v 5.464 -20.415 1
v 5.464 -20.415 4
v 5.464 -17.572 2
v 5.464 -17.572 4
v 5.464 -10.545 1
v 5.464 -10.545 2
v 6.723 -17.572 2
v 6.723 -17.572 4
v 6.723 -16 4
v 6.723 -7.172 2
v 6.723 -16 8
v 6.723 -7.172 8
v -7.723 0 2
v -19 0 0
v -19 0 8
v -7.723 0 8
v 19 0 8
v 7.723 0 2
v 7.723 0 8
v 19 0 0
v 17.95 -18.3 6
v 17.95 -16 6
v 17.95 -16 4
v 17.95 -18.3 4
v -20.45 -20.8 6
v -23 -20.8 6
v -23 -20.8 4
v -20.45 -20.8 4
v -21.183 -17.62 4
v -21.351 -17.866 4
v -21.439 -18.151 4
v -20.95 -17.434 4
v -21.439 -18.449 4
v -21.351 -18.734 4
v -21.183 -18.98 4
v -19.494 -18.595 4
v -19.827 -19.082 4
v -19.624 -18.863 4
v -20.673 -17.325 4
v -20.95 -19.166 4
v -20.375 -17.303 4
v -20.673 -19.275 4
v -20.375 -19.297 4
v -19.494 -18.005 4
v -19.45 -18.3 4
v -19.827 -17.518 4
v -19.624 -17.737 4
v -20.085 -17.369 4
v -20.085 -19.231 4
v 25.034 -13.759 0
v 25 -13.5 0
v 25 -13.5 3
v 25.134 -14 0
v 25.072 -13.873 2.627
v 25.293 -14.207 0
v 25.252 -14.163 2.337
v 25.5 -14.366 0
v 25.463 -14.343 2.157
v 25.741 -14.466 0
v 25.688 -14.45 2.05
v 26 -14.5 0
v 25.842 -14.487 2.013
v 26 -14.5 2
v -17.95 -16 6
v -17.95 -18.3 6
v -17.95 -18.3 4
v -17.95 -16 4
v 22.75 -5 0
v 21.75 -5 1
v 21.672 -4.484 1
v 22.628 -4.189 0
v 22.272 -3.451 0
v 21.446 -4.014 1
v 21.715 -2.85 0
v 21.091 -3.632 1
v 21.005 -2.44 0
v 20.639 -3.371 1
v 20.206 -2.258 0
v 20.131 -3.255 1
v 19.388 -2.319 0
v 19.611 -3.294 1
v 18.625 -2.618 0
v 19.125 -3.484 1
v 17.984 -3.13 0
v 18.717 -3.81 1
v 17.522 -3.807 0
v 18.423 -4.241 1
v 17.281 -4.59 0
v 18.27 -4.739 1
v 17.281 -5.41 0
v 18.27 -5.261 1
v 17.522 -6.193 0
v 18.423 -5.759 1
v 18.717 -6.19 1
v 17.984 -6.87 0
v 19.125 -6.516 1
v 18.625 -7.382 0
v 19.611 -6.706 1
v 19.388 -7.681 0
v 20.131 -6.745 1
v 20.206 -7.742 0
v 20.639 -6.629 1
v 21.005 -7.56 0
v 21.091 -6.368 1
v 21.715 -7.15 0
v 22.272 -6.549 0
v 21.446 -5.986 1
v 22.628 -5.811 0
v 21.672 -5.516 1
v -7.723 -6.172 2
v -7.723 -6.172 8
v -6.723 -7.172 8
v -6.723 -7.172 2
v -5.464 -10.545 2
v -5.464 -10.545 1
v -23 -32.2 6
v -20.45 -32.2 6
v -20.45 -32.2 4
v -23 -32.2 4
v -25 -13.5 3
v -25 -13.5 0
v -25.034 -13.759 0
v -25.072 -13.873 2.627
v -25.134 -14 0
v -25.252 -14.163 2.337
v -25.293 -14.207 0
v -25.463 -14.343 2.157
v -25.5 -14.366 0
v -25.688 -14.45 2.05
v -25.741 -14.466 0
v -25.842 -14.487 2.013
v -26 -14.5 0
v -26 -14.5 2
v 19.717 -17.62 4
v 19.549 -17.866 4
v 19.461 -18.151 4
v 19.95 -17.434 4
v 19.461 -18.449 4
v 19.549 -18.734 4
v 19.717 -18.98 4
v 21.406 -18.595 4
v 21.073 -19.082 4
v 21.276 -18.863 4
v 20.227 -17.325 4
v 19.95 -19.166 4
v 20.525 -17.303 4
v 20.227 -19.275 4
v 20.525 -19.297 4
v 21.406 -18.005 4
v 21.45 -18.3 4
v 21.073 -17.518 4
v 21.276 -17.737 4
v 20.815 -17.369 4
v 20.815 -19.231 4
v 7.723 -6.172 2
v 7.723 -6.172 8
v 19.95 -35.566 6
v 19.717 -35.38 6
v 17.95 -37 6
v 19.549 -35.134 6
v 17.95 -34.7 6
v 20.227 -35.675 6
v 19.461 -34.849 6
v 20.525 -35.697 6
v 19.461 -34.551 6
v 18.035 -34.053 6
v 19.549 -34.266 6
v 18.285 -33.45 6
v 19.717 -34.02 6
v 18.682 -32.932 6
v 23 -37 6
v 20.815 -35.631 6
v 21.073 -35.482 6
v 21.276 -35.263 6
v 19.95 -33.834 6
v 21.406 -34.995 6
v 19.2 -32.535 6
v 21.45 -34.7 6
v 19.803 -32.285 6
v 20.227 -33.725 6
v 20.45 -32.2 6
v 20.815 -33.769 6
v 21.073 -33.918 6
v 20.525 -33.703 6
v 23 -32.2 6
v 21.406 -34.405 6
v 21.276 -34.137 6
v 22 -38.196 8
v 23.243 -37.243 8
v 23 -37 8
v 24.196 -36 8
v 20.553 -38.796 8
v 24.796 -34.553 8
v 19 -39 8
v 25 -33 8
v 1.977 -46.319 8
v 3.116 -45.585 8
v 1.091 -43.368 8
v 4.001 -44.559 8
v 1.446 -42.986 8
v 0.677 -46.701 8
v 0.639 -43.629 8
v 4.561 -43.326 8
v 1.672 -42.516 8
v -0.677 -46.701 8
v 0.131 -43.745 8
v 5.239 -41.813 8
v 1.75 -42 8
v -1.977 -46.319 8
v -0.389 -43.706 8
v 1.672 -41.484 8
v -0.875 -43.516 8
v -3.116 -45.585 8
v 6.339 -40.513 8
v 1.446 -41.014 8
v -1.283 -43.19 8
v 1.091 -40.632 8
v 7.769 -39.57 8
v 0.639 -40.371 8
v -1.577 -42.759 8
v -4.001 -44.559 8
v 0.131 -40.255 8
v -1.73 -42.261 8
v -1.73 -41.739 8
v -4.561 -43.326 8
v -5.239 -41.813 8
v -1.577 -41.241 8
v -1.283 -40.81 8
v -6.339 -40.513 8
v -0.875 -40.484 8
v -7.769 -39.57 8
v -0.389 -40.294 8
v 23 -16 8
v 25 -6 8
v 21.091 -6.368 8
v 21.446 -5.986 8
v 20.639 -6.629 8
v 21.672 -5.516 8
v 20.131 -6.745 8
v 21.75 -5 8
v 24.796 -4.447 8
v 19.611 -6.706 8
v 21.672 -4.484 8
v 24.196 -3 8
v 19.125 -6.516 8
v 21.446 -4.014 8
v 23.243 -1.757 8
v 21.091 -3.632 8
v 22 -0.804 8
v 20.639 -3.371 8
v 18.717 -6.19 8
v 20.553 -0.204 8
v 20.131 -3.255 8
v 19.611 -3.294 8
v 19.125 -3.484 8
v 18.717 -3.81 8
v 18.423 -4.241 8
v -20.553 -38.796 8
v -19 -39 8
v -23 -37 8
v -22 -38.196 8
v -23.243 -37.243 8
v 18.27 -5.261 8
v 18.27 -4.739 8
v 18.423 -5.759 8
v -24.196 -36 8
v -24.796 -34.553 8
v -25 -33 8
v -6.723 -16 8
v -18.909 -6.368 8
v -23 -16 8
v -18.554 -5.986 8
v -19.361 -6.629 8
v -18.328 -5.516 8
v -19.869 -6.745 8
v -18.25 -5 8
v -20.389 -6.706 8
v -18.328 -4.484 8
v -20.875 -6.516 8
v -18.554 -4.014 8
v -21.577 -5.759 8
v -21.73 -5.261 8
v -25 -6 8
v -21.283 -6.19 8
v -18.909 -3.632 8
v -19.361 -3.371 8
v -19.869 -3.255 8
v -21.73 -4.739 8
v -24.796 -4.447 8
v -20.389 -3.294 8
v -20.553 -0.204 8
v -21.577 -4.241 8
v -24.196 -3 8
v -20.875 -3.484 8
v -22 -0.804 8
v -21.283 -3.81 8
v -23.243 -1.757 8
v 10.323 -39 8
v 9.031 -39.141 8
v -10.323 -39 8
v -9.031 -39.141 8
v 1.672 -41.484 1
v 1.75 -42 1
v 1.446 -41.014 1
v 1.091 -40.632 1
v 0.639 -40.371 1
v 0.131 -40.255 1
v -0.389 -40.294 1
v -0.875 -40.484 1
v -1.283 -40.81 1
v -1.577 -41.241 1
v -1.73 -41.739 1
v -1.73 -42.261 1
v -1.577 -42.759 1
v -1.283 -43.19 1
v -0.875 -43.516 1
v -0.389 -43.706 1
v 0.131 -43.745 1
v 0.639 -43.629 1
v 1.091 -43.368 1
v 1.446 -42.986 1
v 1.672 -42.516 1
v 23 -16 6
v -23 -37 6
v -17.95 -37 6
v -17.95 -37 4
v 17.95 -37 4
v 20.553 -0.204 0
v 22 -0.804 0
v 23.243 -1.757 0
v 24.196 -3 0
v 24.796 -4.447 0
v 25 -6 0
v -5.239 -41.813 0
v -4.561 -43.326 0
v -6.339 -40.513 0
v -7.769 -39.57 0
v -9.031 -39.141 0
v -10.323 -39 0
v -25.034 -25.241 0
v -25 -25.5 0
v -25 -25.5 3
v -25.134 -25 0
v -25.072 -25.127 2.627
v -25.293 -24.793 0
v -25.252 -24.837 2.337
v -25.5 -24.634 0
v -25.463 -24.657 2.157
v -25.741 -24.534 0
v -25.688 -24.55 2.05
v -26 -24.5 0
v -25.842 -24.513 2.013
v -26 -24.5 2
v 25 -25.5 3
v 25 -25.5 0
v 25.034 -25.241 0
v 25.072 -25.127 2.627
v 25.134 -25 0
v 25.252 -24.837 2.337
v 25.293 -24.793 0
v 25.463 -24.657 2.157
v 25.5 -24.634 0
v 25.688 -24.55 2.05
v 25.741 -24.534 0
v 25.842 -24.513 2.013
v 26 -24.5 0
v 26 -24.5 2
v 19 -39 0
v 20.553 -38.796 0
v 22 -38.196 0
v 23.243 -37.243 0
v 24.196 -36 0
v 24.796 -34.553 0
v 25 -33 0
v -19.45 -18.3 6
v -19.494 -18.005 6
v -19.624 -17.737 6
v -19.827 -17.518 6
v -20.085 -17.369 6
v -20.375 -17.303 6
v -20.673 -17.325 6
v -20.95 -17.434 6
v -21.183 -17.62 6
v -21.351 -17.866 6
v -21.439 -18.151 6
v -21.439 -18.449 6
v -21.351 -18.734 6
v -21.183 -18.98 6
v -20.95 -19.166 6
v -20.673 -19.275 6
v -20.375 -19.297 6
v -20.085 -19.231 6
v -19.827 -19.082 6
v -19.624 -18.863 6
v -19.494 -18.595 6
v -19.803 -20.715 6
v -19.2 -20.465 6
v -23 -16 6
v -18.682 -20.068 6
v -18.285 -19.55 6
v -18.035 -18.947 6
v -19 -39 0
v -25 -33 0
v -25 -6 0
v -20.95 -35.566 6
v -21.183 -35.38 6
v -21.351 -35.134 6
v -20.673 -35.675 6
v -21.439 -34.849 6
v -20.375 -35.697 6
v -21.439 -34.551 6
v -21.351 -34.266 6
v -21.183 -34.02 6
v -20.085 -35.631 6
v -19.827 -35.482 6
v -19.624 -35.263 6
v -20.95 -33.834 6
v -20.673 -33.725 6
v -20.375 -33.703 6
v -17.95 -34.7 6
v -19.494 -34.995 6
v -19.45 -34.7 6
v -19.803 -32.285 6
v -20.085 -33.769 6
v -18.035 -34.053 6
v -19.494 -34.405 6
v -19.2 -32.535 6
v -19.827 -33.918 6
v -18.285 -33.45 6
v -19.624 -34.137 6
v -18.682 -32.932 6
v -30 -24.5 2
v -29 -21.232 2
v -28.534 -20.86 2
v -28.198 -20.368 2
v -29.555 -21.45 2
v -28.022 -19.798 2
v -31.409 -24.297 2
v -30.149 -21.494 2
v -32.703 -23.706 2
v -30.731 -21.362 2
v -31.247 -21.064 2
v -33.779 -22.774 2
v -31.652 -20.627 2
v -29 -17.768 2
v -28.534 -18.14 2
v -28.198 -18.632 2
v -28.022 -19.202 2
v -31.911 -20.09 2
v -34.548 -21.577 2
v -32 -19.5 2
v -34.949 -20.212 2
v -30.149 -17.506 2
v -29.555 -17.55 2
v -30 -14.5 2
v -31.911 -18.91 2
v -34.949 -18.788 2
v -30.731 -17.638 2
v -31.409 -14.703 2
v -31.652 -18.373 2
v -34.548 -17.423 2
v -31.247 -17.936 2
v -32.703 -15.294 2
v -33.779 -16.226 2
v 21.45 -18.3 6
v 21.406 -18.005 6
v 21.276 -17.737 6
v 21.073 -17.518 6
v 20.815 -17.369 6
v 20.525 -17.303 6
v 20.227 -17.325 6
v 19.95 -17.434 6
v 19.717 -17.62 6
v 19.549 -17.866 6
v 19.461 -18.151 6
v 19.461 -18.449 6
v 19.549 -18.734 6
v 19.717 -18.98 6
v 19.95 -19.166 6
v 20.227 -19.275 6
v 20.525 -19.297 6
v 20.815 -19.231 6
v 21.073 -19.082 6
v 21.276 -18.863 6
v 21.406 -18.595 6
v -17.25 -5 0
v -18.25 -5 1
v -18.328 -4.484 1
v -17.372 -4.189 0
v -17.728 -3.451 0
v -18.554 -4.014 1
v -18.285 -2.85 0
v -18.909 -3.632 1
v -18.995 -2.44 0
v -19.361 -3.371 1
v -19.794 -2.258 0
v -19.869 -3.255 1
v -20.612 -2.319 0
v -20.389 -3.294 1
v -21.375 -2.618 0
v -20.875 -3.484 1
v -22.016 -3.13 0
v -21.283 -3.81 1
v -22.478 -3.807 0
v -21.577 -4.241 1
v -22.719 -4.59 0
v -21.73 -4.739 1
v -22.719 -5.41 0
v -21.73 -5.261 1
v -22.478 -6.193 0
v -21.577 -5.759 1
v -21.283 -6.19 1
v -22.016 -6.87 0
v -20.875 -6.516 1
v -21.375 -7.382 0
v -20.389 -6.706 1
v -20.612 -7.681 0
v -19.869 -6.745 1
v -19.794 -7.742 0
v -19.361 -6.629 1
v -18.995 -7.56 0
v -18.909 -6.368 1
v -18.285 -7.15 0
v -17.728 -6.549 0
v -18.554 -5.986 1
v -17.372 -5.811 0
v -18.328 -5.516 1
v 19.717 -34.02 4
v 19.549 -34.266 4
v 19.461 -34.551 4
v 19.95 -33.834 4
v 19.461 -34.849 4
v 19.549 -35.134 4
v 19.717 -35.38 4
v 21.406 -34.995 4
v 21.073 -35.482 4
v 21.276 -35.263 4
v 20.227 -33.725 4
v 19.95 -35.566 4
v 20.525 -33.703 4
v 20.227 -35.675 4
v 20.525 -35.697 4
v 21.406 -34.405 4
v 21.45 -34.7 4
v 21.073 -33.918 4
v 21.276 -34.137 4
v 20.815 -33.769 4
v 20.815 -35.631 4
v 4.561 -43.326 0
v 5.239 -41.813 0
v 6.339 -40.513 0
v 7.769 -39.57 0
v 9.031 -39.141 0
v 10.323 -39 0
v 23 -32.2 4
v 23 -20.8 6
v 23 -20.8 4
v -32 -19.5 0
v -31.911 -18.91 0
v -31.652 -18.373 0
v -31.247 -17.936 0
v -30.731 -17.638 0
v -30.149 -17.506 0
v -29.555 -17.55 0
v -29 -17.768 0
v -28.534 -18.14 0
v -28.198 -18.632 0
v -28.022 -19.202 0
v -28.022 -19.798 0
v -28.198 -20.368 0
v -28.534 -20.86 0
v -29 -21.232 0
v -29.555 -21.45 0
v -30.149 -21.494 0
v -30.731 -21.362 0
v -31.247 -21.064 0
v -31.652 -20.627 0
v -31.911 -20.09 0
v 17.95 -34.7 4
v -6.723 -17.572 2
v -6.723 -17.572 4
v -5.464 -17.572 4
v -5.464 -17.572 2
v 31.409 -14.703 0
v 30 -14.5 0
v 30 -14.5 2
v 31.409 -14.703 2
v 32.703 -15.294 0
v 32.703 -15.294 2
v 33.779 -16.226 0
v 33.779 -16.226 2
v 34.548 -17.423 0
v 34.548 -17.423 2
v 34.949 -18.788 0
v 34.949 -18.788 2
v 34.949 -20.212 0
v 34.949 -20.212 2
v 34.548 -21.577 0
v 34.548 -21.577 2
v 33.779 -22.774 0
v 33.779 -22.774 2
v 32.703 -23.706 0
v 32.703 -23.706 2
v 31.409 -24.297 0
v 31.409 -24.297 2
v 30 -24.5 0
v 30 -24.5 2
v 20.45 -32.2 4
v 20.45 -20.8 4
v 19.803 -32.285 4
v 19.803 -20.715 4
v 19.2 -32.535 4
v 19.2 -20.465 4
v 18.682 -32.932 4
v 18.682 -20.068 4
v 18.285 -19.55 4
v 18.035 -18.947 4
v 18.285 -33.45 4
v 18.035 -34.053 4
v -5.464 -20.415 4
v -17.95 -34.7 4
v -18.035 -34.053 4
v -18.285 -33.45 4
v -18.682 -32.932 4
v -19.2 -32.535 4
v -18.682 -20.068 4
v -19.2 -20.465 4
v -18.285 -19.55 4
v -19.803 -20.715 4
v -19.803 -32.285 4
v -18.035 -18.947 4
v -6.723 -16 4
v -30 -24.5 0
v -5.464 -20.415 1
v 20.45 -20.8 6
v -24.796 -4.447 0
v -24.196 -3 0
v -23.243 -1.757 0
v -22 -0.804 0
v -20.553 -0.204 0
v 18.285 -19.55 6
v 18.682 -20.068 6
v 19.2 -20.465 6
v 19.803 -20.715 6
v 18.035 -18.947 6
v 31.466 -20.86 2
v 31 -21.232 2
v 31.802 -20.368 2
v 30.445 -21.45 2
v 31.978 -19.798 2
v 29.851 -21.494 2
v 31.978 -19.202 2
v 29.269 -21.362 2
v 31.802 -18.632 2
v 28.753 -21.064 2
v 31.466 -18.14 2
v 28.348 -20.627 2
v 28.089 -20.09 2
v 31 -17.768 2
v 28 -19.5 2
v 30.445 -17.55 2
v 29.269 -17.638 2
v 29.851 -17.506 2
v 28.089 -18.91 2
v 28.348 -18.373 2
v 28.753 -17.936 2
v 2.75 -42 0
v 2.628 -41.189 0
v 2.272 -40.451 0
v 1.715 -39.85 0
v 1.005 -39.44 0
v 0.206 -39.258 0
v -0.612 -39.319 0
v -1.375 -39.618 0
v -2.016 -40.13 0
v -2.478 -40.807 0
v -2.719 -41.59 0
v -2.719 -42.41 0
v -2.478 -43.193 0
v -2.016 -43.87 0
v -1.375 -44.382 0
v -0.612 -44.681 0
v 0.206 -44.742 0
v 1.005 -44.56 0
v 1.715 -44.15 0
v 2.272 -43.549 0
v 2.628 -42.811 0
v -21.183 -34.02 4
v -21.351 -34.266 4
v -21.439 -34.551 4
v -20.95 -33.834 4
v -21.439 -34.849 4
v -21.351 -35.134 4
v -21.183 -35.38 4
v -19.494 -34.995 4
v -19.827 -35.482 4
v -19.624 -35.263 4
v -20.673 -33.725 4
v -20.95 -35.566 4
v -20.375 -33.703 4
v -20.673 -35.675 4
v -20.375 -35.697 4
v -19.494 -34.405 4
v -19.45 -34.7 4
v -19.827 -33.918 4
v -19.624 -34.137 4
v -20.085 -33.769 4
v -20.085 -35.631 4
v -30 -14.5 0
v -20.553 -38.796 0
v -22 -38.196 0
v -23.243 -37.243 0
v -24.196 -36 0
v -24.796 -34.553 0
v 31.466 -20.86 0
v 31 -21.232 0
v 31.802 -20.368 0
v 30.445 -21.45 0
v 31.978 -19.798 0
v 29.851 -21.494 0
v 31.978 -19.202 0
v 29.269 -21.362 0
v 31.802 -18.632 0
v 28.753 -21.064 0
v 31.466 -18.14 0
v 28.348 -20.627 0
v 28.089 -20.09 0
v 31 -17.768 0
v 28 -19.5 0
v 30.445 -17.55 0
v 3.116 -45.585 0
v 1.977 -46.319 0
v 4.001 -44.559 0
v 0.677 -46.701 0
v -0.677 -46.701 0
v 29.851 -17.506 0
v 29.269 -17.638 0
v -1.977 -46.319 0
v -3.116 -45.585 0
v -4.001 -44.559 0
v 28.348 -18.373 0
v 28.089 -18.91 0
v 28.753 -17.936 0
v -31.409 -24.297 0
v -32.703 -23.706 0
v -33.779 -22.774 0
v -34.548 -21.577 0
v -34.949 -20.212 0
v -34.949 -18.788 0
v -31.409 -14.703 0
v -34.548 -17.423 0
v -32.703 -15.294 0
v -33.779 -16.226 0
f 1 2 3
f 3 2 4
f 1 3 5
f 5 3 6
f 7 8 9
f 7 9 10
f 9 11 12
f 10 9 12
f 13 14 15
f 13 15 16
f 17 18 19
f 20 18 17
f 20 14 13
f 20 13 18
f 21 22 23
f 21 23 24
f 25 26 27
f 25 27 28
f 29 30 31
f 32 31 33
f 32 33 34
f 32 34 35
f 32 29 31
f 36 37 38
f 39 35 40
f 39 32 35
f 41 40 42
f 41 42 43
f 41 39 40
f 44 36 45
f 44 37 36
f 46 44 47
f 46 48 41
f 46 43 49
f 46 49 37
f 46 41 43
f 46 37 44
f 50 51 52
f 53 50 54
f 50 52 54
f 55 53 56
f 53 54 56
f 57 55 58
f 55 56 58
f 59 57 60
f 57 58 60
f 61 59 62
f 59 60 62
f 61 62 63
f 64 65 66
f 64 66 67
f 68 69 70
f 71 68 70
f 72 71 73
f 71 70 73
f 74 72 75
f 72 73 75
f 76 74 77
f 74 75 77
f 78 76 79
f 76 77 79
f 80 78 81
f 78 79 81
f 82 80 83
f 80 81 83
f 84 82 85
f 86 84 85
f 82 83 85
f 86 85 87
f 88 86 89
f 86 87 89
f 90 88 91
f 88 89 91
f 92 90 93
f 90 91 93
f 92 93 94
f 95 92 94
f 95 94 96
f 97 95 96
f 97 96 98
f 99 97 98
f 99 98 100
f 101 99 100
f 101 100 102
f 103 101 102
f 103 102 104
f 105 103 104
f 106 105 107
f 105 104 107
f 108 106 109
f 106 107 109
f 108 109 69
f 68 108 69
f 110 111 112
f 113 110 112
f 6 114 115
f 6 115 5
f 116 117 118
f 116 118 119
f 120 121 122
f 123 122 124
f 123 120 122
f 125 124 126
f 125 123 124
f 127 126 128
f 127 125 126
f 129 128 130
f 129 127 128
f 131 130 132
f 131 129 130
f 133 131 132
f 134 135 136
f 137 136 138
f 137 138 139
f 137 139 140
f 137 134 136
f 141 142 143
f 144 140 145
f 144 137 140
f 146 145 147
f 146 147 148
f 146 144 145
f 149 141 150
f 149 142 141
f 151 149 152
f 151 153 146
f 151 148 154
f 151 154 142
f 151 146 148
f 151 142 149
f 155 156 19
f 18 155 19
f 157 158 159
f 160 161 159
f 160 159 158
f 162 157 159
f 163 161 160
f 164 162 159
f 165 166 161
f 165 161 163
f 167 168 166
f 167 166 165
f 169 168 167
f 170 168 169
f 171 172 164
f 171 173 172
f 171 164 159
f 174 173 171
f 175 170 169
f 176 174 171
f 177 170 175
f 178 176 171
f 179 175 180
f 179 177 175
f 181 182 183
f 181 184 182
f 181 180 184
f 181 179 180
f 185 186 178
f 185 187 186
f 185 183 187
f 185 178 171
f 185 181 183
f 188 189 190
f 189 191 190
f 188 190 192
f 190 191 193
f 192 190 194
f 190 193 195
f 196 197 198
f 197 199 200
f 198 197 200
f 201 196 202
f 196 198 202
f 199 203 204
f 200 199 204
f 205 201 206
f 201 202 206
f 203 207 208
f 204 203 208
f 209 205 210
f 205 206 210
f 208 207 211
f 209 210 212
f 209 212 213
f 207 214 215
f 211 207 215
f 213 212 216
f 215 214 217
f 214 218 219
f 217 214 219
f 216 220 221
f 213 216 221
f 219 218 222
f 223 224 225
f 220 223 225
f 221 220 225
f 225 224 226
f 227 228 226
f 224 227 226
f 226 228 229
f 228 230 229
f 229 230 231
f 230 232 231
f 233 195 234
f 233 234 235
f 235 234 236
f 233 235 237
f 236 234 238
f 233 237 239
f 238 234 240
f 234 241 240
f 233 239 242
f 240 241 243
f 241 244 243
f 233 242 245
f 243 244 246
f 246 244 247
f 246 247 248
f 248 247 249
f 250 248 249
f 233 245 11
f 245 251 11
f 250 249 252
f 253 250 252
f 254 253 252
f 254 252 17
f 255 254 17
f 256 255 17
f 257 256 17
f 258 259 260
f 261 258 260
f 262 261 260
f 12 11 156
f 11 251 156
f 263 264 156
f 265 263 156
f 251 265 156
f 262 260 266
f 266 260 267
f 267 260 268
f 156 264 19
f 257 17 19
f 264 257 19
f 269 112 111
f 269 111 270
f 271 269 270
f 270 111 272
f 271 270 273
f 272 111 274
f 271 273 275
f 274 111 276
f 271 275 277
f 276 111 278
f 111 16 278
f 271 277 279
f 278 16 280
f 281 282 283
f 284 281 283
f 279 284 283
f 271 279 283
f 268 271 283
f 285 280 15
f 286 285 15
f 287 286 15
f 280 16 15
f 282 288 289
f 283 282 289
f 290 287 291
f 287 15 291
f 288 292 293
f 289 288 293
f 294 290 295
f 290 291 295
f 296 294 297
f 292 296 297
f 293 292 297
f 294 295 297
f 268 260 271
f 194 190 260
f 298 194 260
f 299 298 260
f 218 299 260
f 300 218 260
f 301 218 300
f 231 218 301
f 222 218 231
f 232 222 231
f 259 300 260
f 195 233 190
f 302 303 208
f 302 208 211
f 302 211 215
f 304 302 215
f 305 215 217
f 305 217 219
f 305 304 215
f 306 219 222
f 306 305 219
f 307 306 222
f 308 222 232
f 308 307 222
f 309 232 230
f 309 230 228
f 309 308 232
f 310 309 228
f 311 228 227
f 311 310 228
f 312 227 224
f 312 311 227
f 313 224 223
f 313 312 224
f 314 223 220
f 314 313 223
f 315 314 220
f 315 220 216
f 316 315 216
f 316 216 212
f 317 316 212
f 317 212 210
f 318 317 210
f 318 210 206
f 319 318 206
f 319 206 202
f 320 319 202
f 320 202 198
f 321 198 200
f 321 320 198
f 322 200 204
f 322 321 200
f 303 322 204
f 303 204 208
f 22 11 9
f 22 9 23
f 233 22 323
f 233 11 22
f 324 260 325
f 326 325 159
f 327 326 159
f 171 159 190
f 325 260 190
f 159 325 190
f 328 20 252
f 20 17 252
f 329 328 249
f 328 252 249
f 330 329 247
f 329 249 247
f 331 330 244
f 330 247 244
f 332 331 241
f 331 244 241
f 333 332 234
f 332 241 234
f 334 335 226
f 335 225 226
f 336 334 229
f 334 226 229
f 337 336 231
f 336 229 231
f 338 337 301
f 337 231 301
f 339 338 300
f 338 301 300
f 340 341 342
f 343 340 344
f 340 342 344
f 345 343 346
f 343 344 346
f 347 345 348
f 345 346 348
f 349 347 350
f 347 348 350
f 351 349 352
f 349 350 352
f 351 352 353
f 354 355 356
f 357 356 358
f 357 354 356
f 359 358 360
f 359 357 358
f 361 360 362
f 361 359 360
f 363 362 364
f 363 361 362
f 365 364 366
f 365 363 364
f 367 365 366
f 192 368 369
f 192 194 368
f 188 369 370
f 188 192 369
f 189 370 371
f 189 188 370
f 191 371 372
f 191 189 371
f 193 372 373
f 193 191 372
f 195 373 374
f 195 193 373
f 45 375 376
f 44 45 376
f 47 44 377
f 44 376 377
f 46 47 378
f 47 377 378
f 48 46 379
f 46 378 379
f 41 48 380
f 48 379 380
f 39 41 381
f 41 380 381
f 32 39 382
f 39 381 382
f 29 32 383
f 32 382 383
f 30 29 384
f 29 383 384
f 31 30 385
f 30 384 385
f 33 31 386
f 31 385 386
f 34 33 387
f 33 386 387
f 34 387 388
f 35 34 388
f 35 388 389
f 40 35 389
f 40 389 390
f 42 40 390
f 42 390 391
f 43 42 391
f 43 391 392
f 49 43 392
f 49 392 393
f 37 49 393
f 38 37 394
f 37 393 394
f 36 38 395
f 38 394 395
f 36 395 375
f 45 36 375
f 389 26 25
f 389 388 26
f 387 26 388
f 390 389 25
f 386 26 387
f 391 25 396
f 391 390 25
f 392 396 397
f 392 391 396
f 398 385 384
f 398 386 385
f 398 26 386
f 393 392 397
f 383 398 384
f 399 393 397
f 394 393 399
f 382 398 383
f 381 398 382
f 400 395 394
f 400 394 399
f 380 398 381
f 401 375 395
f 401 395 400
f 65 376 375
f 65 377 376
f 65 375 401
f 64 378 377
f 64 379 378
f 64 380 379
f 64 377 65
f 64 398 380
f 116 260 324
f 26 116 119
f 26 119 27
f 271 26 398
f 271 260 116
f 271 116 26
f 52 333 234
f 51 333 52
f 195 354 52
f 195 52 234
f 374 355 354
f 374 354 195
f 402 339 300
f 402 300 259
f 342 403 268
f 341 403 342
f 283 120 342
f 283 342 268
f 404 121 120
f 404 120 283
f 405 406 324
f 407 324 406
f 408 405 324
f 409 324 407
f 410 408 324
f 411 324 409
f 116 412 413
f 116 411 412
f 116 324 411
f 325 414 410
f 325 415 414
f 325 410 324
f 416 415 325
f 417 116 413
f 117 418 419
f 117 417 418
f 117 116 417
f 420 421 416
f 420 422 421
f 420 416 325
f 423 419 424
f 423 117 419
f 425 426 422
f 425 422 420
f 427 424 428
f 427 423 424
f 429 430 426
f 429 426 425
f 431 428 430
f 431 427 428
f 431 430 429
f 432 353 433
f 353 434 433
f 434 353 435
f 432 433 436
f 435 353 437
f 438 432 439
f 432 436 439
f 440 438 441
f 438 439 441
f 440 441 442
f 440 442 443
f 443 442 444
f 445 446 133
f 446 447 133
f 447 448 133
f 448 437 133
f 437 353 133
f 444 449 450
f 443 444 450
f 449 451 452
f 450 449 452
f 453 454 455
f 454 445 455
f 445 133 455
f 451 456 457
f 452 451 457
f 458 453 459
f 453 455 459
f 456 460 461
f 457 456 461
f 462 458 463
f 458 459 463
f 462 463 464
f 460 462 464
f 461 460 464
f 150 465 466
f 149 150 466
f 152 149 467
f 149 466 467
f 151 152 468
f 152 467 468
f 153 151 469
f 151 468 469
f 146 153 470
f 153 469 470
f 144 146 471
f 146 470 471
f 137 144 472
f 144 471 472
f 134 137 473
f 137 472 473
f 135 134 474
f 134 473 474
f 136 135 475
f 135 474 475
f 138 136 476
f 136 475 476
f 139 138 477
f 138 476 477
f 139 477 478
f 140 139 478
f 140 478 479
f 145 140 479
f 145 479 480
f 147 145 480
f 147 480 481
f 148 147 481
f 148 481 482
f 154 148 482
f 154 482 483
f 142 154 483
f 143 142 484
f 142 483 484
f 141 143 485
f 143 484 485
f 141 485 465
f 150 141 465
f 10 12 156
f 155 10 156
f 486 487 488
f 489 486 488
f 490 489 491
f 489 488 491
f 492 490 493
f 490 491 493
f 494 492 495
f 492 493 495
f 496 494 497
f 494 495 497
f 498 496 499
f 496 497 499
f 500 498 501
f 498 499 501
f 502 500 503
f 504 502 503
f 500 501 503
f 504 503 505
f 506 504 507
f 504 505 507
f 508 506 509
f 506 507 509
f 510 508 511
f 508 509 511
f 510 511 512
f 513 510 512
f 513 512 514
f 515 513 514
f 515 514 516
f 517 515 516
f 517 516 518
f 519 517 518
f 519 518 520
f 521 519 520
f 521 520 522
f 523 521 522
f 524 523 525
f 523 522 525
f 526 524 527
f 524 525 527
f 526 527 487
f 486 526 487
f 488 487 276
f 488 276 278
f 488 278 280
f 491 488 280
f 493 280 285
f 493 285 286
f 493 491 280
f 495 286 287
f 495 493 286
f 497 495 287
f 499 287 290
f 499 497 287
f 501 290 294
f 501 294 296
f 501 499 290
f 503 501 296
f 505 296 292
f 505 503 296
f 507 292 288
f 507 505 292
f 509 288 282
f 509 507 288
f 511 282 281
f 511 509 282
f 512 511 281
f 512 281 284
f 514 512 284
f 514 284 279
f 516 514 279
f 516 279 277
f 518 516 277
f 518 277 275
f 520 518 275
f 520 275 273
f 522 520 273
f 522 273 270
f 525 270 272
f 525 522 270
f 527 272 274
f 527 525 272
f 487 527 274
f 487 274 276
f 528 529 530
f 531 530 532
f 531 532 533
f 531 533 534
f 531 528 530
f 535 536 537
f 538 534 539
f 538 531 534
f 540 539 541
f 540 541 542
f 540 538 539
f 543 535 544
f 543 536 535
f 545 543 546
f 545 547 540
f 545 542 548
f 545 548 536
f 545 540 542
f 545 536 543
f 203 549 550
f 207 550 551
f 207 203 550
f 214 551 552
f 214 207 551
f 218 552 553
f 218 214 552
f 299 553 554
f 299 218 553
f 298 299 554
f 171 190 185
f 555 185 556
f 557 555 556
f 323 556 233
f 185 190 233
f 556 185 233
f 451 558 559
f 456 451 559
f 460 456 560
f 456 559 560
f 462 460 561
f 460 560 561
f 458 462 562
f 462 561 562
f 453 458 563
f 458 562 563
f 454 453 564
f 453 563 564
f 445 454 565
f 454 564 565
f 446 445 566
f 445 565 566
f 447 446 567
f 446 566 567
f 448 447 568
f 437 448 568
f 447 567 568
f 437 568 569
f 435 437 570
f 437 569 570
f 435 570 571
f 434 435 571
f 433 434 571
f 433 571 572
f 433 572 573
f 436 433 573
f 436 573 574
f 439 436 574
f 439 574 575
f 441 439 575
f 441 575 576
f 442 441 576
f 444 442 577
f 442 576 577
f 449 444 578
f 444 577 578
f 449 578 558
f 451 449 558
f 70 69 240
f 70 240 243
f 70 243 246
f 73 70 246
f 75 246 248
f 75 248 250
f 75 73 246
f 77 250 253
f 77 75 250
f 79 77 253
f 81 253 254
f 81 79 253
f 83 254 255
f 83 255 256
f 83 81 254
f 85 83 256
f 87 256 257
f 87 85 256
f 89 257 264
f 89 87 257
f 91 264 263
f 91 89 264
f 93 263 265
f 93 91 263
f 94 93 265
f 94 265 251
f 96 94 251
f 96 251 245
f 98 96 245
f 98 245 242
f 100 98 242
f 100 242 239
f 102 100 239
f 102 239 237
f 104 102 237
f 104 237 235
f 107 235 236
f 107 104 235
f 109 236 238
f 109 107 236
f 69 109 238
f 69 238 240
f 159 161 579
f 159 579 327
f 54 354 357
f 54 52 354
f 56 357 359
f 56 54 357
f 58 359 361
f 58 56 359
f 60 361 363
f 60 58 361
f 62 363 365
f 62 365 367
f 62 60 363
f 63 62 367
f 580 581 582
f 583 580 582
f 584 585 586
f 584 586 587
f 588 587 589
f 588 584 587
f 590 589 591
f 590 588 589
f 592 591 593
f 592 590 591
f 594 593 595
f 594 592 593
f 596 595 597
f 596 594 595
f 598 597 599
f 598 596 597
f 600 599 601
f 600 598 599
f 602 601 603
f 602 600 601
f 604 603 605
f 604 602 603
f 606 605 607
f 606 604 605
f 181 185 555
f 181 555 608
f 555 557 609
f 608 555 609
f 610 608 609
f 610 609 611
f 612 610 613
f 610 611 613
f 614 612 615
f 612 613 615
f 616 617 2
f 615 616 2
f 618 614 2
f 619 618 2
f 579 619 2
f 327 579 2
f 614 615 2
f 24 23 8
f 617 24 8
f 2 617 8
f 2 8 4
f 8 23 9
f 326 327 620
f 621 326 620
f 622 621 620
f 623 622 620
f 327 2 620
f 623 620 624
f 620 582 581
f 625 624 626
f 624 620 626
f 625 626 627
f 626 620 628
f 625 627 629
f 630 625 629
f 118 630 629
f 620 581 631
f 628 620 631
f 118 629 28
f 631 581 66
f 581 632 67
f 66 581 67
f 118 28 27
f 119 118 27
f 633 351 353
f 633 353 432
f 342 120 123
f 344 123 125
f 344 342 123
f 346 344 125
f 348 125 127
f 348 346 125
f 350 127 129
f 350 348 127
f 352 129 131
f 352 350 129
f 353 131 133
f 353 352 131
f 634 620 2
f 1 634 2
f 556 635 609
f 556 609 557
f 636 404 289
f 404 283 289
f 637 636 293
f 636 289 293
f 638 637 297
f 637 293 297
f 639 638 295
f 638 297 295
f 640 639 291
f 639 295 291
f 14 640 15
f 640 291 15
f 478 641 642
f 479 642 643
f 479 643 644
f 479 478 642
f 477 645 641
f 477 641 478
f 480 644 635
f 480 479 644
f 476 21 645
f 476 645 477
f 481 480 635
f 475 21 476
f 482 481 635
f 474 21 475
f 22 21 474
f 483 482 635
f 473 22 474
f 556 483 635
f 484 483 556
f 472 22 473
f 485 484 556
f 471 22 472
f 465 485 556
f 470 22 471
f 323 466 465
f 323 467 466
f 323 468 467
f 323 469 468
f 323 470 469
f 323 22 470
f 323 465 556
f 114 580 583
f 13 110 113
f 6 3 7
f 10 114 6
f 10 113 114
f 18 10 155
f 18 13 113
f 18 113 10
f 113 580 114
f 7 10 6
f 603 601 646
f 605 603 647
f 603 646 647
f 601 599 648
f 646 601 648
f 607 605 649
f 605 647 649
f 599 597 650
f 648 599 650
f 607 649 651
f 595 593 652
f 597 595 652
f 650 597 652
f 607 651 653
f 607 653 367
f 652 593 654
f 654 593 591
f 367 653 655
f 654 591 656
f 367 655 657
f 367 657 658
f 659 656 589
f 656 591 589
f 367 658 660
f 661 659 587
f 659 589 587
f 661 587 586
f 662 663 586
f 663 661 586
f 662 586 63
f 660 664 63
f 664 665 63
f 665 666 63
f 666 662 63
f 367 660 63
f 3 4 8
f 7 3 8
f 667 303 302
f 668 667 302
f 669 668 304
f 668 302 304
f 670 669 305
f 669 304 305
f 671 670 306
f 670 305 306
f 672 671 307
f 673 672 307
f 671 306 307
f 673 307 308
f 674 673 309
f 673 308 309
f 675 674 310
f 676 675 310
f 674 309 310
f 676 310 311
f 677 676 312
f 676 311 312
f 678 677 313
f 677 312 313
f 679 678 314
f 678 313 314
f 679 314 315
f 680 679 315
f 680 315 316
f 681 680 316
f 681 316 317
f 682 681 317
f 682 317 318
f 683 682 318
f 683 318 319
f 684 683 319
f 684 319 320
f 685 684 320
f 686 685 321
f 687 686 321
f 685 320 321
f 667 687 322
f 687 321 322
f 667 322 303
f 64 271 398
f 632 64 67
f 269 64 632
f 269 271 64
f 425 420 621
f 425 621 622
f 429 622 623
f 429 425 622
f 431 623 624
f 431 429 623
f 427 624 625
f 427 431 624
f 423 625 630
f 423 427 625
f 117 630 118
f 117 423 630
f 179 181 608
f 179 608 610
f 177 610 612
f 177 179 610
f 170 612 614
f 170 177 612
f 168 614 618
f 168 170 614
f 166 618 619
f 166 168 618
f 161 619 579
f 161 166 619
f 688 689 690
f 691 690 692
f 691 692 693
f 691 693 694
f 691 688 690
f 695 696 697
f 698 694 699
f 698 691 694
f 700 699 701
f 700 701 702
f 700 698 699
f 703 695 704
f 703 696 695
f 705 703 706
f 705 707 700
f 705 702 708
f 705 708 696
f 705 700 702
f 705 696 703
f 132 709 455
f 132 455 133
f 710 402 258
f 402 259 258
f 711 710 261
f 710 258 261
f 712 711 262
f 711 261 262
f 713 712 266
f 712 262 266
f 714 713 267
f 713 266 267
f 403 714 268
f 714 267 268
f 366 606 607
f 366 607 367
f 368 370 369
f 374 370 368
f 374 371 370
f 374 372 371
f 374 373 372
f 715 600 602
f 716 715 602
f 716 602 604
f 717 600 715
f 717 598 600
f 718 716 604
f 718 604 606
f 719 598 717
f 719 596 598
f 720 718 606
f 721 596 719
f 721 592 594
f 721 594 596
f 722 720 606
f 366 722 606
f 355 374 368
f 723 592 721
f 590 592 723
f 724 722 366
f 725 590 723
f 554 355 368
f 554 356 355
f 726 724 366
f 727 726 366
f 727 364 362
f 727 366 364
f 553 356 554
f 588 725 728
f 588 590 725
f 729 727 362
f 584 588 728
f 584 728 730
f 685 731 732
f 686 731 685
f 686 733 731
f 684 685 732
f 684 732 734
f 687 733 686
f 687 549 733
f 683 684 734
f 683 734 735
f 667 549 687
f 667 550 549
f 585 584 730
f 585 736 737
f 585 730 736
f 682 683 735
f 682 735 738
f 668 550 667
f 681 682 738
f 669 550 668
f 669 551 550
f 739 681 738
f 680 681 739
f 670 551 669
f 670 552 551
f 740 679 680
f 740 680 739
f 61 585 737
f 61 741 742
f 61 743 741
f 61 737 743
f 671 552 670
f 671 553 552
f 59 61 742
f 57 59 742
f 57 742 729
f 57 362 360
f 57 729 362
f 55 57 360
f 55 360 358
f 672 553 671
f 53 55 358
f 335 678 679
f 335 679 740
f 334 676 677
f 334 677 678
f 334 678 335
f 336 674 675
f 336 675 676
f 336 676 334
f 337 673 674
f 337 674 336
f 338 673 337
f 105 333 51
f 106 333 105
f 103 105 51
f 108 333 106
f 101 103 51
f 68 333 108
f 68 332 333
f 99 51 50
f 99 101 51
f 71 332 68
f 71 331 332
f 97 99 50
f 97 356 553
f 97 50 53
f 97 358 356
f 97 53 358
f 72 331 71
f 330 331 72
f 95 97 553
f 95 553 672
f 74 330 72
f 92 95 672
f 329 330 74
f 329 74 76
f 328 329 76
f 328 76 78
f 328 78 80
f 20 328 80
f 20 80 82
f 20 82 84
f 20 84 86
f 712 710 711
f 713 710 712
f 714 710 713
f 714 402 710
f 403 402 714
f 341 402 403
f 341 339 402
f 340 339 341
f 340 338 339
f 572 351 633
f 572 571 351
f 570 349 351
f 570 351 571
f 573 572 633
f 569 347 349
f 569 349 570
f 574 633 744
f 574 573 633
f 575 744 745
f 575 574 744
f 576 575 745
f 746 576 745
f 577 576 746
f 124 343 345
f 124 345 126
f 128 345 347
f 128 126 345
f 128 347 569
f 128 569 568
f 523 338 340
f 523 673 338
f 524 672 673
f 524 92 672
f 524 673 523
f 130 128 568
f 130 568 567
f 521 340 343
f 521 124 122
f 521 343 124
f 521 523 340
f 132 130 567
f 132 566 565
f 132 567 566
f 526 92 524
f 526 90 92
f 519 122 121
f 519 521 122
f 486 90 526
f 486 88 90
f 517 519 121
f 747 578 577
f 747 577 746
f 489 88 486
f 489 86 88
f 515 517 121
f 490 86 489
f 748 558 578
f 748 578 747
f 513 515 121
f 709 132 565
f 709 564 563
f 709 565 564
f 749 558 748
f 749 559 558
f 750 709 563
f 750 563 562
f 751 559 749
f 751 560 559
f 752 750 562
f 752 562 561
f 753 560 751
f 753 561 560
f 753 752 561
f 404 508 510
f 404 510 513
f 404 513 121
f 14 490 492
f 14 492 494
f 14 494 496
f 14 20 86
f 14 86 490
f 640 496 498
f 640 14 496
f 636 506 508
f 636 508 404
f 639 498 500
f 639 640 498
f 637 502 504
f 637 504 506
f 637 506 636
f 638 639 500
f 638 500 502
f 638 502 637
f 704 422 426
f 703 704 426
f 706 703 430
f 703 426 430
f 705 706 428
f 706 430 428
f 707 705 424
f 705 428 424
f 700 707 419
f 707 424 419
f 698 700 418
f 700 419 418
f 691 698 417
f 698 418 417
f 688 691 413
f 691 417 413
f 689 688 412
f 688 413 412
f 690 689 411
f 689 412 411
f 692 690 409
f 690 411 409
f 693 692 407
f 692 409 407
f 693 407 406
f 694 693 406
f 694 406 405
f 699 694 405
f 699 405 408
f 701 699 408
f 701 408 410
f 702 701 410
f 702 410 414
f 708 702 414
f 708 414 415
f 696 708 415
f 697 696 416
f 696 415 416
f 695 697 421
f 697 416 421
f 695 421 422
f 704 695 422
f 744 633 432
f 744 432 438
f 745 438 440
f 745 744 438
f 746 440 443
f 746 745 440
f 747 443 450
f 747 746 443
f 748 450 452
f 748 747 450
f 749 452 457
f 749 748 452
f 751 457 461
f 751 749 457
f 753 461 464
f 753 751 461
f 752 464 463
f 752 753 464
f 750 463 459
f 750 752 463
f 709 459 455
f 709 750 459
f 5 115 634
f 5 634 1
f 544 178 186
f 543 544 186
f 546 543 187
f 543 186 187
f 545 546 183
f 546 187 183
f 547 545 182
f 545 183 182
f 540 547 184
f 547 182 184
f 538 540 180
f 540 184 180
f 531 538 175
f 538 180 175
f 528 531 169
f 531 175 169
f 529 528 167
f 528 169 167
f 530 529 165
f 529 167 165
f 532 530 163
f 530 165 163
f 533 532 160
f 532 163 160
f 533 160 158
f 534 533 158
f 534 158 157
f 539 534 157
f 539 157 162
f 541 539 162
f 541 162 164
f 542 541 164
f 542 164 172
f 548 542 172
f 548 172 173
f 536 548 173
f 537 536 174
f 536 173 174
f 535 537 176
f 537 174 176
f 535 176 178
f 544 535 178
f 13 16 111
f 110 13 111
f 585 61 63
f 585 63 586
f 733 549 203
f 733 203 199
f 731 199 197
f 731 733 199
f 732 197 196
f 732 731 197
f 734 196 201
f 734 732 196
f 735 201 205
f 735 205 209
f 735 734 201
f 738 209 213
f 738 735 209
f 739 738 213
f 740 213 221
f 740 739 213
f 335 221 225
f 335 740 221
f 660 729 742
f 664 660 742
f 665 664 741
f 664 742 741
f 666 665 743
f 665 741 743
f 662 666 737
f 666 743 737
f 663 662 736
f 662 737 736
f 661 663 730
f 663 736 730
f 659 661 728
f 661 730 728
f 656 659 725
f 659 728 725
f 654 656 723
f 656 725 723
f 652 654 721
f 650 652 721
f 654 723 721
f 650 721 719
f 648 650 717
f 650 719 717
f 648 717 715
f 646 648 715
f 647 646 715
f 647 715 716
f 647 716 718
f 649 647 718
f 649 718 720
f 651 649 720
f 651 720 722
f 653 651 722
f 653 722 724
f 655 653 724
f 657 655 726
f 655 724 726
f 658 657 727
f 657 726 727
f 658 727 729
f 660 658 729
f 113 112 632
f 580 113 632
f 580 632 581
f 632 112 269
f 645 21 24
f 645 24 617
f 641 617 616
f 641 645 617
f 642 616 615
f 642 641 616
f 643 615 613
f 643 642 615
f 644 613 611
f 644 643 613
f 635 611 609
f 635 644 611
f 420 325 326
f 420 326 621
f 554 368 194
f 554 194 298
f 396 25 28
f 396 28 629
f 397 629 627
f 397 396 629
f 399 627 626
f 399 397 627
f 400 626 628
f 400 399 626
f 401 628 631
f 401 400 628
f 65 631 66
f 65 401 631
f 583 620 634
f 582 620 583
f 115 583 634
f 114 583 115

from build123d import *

# Parameters (mm, degrees)
SKETCH1_R           = 1.75
BOSS_EXTRUDE1_DEPTH = 8
SKETCH2_W           = 46
SKETCH2_H           = 21
CUT_EXTRUDE1_DEPTH  = 2
SKETCH3_R           = 1
CUT_EXTRUDE2_DEPTH  = 2
CUT_EXTRUDE3_DEPTH  = 6
SKETCH5_W           = 10.927537962
SKETCH5_H           = 9.870451426
CUT_EXTRUDE4_DEPTH  = 7
FILLET4_R           = 6
CHAMFER2_SIZE       = 1
SKETCH7_R           = 2
BOSS_EXTRUDE2_DEPTH = 2
FILLET5_R           = 1


with BuildPart() as part:
    # Sketch1 → Boss-Extrude1 (new body)
    with BuildSketch(Plane.XY):
        with BuildLine():
            Line((-4.75, -42), (-4.75, -39))
            Line((-4.75, -39), (-25, -39))
            Line((-25, -39), (-25, 0))
            Line((-25, 0), (25, 0))
            Line((25, 0), (25, -39))
            Line((25, -39), (4.75, -39))
            Line((4.75, -39), (4.75, -42))
            ThreePointArc((4.75, -42), (0, -46.75), (-4.75, -42))
        make_face()
        with Locations((-20, -5)):
            Circle(SKETCH1_R, mode=Mode.SUBTRACT)
        with Locations((20, -5)):
            Circle(SKETCH1_R, mode=Mode.SUBTRACT)
        with Locations((0, -42)):
            Circle(SKETCH1_R, mode=Mode.SUBTRACT)
    extrude(amount=BOSS_EXTRUDE1_DEPTH)

    # Sketch2 → Cut-Extrude1 (cut)
    with BuildSketch(Plane.XY.offset(8)):
        with Locations((0, -26.5)):
            Rectangle(SKETCH2_W, SKETCH2_H)
    extrude(amount=-CUT_EXTRUDE1_DEPTH, mode=Mode.SUBTRACT)

    # Sketch3 → Cut-Extrude2 (cut)
    with BuildSketch(Plane.XY.offset(6)):
        with Locations((-20.45, -18.3)):
            Circle(SKETCH3_R)
        with Locations((20.45, -18.3)):
            Circle(SKETCH3_R)
        with Locations((20.45, -34.7)):
            Circle(SKETCH3_R)
        with Locations((-20.45, -34.7)):
            Circle(SKETCH3_R)
        with BuildLine():
            Line((-17.95, -18.3), (-17.95, -16))
            Line((-17.95, -16), (17.95, -16))
            Line((17.95, -16), (17.95, -18.3))
            ThreePointArc((17.95, -18.3), (18.682233047, -20.067766953), (20.45, -20.8))
            Line((20.45, -20.8), (23, -20.8))
            Line((23, -20.8), (23, -32.2))
            Line((23, -32.2), (20.45, -32.2))
            ThreePointArc((20.45, -32.2), (18.682233047, -32.932233047), (17.95, -34.7))
            Line((17.95, -34.7), (17.95, -37))
            Line((17.95, -37), (-17.95, -37))
            Line((-17.95, -37), (-17.95, -34.7))
            ThreePointArc((-17.95, -34.7), (-18.682233047, -32.932233047), (-20.45, -32.2))
            Line((-20.45, -32.2), (-23, -32.2))
            Line((-23, -32.2), (-23, -20.8))
            Line((-23, -20.8), (-20.45, -20.8))
            ThreePointArc((-20.45, -20.8), (-18.682233047, -20.067766953), (-17.95, -18.3))
        make_face()
    extrude(amount=-CUT_EXTRUDE2_DEPTH, mode=Mode.SUBTRACT)

    # Sketch4 → Cut-Extrude3 (cut)
    with BuildSketch(Plane.XY.offset(8)):
        Polygon((-7.723, 0), (-7.723, -6.1725), (-6.723, -7.1725), (-6.723, -17.5725), (6.723, -17.5725), (6.723, -7.1725), (7.723, -6.1725), (7.723, 0), align=None)
    extrude(amount=-CUT_EXTRUDE3_DEPTH, mode=Mode.SUBTRACT)

    # Sketch5 → Cut-Extrude4 (cut)
    with BuildSketch(Plane.XY.offset(8)):
        with Locations((0, -15.479727473)):
            Rectangle(SKETCH5_W, SKETCH5_H)
    extrude(amount=-CUT_EXTRUDE4_DEPTH, mode=Mode.SUBTRACT)

    # Fillet4
    fillet4_edges = [part.edges().sort_by_distance(p)[0] for p in [
        (25, -39, 4),
        (4.75, -39, 4),
        (-25, -39, 4),
        (-4.75, -39, 4),
        (25, 0, 4),
        (-25, 0, 4),
    ]]
    fillet(fillet4_edges, radius=FILLET4_R)

    # Chamfer2
    chamfer2_edges = [part.edges().sort_by_distance(p)[0] for p in [
        (-1.75, -42, 0),
        (-21.75, -5, 0),
        (18.25, -5, 0),
    ]]
    chamfer(chamfer2_edges, length=CHAMFER2_SIZE)

    # Sketch7 → Boss-Extrude2 (add)
    with BuildSketch(Plane(origin=(0, 0, 0), x_dir=(-1, 0, 0), z_dir=(0, 0, -1))):
        with BuildLine():
            Line((-25, -14.5), (-30, -14.5))
            ThreePointArc((-30, -14.5), (-35, -19.5), (-30, -24.5))
            Line((-30, -24.5), (-25, -24.5))
            Line((-25, -24.5), (-25, -14.5))
        make_face()
        with Locations((-30, -19.5)):
            Circle(SKETCH7_R, mode=Mode.SUBTRACT)
        with BuildLine():
            Line((30, -14.5), (25, -14.5))
            Line((25, -14.5), (25, -24.5))
            Line((25, -24.5), (30, -24.5))
            ThreePointArc((30, -24.5), (35, -19.5), (30, -14.5))
        make_face()
        with Locations((30, -19.5)):
            Circle(SKETCH7_R, mode=Mode.SUBTRACT)
    extrude(amount=-BOSS_EXTRUDE2_DEPTH)

    # Fillet5
    fillet5_edges = [part.edges().sort_by_distance(p)[0] for p in [
        (25, -14.5, 1),
        (25, -24.5, 1),
        (25, -19.5, 2),
        (-25, -24.5, 1),
        (-25, -14.5, 1),
        (-25, -19.5, 2),
    ]]
    fillet(fillet5_edges, radius=FILLET5_R)


solid = part.part
